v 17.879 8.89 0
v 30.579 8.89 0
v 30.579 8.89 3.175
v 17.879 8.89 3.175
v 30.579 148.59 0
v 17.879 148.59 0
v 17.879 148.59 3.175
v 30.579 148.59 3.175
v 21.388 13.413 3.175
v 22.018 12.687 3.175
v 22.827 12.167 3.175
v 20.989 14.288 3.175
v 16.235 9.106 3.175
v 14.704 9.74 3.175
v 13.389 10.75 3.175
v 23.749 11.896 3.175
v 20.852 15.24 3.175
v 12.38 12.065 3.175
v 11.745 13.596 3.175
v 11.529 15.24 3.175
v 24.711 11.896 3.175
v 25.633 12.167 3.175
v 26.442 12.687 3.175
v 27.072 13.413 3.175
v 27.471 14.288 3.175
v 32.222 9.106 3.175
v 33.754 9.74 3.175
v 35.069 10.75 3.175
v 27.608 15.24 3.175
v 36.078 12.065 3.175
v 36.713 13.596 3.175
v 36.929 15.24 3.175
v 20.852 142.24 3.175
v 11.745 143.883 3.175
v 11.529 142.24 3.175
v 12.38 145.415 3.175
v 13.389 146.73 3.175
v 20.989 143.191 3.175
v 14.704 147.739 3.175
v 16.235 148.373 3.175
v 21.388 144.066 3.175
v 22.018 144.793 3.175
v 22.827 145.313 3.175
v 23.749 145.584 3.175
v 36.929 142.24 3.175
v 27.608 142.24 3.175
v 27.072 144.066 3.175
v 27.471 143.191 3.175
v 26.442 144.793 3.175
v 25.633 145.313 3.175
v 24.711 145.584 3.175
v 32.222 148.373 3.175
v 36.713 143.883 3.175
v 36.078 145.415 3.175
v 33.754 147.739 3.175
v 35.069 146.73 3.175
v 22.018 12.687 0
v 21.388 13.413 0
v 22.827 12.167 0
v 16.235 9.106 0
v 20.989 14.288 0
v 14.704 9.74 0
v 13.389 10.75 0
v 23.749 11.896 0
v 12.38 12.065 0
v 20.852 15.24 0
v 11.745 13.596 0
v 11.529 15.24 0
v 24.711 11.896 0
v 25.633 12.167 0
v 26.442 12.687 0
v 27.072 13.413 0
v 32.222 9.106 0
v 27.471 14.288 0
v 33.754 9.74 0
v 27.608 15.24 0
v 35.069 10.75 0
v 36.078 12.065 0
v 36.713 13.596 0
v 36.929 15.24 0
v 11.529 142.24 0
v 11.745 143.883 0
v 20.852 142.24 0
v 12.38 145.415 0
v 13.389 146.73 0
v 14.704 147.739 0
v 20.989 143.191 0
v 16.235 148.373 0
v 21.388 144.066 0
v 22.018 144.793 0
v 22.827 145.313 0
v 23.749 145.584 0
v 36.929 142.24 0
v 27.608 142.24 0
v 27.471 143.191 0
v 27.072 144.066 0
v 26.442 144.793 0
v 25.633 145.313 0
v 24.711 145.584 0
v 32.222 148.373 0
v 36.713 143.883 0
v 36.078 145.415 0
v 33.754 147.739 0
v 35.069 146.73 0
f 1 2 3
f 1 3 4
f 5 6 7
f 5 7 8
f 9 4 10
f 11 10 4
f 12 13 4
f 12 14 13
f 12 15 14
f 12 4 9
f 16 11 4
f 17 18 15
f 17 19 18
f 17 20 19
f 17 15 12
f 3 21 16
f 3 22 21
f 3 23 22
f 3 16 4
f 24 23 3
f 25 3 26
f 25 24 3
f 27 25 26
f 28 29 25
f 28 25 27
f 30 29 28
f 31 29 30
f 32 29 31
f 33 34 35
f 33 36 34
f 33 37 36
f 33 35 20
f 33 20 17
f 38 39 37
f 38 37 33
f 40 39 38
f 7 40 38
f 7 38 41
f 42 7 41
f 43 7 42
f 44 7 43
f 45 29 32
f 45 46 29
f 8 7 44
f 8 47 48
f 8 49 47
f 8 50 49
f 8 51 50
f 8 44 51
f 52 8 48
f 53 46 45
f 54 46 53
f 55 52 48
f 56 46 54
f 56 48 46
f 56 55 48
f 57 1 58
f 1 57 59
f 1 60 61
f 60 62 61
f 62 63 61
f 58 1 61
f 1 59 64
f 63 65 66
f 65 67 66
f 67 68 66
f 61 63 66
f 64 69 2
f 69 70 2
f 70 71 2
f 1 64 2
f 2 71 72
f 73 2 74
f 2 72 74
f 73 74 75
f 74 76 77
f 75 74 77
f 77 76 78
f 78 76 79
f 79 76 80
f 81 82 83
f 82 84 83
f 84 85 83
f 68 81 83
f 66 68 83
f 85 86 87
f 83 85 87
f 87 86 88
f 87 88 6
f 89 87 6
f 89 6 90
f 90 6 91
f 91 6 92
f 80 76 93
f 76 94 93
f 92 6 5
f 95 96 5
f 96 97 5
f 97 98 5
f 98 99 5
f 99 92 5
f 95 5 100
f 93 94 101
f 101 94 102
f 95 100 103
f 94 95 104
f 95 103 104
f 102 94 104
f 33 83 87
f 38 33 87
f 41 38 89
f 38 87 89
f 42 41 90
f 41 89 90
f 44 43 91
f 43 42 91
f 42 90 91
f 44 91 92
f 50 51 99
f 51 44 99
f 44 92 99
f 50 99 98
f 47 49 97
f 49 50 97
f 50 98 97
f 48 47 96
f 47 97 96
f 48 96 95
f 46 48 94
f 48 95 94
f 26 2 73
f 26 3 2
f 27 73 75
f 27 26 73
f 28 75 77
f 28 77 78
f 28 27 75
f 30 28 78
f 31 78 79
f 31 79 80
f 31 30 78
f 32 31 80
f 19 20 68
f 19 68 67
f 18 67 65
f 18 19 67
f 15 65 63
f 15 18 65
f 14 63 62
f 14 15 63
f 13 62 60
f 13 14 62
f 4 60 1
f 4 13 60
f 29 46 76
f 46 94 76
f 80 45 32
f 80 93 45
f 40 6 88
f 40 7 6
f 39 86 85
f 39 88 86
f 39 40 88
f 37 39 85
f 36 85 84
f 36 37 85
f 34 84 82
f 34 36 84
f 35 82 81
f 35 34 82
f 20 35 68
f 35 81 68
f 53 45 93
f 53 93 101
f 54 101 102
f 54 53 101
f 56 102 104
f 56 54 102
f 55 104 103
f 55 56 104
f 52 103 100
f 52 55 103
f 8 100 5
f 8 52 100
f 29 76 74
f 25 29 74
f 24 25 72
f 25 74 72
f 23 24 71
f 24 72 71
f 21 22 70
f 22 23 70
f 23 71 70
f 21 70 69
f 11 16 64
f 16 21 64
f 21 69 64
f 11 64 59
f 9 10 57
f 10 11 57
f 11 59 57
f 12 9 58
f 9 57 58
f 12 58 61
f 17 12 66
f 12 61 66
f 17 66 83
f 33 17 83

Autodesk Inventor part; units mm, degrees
ref_plane "YZ Plane" through (0, 0, 0) normal (1, 0, 0) x (0, 1, 0)
ref_plane "XZ Plane" through (0, 0, 0) normal (0, 1, 0) x (-1, 0, 0)
ref_plane "XY Plane" through (0, 0, 0) normal (0, 0, 1) x (1, 0, 0)
sketch "Sketch1" plane through (0, 0, 0) normal (0, 0, 1) x (1, 0, 0)
  line L0 (36.9289, 8.8897) -> (11.5289, 8.8897)
  line L1 (36.9289, 148.5897) -> (36.9289, 8.8897)
  line L2 (11.5289, 148.5897) -> (36.9289, 148.5897)
  line L3 (20.8517, 15.2397) -> (20.8517, 142.2397)
  arc A0 (27.6081, 142.2397) -> (20.8517, 142.2397) centre (24.2299, 142.2397) ccw
  line L4 (27.6081, 142.2397) -> (27.6081, 15.2397)
  arc A1 (20.8517, 15.2397) -> (27.6081, 15.2397) centre (24.2299, 15.2397) ccw
  line L5 (36.9289, 148.5897) -> (11.5289, 148.5897)
  line L6 (11.5289, 148.5897) -> (11.5289, 8.8897)
  point P0 (0, 0)
  point P1 (0, 0)
  dimension "d0" = 25.4
  dimension "d2" = 139.7
  dimension "d5" = 6.35
  dimension "d6" = 6.35
  dimension "d7" = 3.3782
  dimension "d8" = 6.7564
  dimension "d9" = 3.3782
extrude "Plate1" add sketch "Sketch1" along normal blind 3.175
fillet "Corner Round1" radius 6.35 4 edges at (36.9289, 148.5897, 1.5875) (11.5289, 148.5897, 1.5875) (36.9289, 8.8897, 1.5875) (11.5289, 8.8897, 1.5875)
equation "\"BendRadius\" = Thickness"
equation "\"BendReliefWidth\" = Thickness"
equation "\"BendReliefDepth\" = 0.5 * Thickness"
equation "\"CornerReliefSize\" = 4 * Thickness"
equation "\"MinimumRemnant\" = 2 * Thickness"
equation "\"TransitionRadius\" = BendRadius"
equation "\"JacobiRadiusSize\" = BendRadius"
equation "\"GapSize\" = Thickness"
equation "\"d1\" = BendRadius"
equation "\"Thickness\" = 3.175"
properties part number "back brace mount" material "Aluminum 6061"
